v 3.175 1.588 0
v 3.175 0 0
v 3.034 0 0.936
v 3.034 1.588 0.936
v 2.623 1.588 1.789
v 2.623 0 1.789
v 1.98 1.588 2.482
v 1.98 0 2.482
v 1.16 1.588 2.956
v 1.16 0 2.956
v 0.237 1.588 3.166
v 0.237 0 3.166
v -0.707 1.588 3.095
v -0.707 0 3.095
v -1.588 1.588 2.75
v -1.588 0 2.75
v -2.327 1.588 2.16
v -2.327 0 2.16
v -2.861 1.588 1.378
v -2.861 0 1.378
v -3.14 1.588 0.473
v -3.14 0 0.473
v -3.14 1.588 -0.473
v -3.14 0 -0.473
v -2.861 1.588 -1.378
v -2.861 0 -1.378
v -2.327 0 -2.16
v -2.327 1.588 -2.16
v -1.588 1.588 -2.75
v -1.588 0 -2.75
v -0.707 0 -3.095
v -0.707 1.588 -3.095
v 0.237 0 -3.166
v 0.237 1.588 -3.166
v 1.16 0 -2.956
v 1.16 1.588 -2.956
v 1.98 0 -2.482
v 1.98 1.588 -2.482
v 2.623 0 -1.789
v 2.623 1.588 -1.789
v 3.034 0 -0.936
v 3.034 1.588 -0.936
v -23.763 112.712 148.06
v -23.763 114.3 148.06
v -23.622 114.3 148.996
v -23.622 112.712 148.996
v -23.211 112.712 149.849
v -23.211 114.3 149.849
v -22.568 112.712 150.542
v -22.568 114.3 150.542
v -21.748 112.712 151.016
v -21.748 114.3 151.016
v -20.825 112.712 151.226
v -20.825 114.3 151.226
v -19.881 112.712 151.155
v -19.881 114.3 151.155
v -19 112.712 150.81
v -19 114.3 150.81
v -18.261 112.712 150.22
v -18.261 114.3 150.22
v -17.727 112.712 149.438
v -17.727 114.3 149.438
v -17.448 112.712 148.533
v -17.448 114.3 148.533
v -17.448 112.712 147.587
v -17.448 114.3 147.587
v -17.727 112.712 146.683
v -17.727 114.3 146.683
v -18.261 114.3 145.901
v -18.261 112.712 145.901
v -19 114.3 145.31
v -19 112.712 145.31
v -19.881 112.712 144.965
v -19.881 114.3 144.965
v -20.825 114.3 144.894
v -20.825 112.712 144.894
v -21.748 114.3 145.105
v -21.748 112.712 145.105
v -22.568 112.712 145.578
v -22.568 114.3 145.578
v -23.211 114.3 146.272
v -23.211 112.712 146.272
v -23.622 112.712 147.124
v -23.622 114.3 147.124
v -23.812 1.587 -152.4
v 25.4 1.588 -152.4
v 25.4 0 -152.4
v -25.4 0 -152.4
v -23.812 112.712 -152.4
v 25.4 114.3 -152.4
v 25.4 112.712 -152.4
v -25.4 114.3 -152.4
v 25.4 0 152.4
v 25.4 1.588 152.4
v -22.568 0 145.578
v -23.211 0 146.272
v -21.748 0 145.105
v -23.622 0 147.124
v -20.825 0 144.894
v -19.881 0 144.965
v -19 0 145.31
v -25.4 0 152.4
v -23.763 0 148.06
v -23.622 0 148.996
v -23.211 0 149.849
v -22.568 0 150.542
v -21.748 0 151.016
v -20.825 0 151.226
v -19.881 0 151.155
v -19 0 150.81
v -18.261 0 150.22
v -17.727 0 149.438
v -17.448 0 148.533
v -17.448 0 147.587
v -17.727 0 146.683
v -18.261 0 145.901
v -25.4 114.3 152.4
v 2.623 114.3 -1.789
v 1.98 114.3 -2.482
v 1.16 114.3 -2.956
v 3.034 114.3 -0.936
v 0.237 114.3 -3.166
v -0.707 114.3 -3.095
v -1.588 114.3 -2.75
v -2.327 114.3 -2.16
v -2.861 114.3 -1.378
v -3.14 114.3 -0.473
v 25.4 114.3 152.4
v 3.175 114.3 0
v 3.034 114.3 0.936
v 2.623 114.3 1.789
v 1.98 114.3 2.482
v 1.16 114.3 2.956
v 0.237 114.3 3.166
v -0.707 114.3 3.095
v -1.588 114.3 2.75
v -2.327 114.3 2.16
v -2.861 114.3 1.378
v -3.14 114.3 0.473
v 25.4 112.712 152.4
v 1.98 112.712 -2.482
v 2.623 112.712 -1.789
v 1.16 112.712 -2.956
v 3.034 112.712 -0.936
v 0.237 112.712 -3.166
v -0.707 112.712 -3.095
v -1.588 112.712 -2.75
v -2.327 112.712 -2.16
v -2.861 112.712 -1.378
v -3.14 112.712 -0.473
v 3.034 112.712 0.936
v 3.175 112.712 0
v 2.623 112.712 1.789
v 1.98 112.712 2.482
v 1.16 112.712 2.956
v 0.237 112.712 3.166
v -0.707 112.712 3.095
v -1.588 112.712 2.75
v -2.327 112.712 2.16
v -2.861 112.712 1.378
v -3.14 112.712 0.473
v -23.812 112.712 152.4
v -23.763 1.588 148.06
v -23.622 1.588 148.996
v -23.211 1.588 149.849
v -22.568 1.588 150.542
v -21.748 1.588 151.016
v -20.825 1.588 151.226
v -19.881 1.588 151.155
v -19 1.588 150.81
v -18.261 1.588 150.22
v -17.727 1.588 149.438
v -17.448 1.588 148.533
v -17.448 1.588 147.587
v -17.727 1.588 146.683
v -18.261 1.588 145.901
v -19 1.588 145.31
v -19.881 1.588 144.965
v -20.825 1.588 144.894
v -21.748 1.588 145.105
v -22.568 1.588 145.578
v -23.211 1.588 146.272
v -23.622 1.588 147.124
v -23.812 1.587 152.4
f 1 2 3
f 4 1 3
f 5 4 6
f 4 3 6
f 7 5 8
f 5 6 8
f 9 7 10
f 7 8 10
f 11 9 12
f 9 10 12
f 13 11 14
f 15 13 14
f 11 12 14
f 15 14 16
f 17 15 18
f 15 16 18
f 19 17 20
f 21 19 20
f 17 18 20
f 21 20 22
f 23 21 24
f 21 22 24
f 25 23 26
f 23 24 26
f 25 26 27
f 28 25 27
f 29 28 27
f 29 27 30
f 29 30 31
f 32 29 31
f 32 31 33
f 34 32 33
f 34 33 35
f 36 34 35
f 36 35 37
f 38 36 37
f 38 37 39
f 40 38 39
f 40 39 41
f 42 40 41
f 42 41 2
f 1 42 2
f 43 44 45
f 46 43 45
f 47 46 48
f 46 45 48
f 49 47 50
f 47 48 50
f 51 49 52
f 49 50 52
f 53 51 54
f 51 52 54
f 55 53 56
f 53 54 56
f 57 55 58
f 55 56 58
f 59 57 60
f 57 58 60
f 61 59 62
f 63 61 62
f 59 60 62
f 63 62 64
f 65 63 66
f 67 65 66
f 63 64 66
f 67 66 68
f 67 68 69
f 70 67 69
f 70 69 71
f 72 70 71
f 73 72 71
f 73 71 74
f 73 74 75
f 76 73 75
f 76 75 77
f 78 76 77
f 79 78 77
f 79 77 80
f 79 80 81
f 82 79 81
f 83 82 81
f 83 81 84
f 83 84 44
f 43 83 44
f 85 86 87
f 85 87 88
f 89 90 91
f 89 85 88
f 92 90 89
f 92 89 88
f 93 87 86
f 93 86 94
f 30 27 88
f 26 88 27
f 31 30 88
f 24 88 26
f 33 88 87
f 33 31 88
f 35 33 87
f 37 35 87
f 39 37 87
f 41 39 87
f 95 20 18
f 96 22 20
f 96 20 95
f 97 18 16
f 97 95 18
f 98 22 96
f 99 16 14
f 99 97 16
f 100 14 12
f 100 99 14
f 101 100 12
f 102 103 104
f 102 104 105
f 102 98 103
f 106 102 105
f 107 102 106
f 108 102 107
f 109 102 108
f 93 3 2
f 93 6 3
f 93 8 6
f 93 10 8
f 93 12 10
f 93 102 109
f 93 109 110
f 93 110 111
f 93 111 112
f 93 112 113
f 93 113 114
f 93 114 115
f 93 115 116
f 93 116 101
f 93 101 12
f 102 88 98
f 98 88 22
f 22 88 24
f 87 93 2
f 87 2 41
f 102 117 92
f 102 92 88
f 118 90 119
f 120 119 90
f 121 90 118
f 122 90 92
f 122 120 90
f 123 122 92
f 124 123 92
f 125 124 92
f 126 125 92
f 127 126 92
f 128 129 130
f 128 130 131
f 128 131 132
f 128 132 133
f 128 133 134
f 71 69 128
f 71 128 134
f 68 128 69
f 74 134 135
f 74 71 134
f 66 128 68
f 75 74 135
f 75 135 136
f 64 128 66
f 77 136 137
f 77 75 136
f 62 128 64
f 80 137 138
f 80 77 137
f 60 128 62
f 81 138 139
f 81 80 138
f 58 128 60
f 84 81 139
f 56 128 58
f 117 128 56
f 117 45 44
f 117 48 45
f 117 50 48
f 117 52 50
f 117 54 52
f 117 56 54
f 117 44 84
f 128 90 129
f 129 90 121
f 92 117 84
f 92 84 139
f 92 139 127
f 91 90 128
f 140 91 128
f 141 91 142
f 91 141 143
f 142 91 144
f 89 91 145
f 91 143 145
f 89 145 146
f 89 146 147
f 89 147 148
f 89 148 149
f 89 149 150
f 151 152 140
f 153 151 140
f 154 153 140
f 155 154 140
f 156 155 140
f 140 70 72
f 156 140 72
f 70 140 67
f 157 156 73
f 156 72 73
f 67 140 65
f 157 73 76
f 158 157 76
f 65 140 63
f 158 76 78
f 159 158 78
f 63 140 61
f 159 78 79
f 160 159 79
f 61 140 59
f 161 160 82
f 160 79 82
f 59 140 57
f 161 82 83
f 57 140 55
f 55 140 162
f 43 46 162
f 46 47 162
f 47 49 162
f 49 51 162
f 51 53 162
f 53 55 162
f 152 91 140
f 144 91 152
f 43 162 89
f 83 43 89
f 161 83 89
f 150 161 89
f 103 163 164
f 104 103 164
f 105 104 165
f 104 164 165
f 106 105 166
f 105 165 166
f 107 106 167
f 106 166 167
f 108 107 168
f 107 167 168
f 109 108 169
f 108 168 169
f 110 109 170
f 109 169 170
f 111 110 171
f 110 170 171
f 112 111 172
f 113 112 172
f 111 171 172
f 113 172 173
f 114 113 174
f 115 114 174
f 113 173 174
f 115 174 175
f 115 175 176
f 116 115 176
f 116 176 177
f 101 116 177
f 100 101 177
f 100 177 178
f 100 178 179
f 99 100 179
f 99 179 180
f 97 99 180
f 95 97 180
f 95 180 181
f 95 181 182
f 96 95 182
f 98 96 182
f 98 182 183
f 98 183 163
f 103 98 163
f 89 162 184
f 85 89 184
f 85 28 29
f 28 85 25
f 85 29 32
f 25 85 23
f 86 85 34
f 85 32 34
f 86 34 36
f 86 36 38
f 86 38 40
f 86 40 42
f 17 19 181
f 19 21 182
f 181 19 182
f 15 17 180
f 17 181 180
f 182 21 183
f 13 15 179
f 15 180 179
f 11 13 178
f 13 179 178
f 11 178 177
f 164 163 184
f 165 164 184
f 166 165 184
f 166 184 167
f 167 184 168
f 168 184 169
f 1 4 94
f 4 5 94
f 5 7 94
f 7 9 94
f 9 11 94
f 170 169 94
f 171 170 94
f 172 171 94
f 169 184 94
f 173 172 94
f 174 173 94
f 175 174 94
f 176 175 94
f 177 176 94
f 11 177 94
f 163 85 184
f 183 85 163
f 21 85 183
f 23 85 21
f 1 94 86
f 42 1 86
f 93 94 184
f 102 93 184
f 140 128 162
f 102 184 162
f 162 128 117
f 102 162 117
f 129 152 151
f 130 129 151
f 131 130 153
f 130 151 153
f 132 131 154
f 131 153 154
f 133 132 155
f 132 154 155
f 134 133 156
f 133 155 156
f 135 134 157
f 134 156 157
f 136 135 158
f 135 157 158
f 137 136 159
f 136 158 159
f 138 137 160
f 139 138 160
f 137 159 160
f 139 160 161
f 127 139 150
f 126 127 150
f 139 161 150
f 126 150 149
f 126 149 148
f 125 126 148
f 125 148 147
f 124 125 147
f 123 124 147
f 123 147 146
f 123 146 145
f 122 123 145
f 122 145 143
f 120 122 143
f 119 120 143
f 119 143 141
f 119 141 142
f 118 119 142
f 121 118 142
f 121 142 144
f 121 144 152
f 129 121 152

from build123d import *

# Parameters (mm, degrees)
F0_W     = 50.8
F0_H     = 304.8
F1_DEPTH = 1.5875
F2_W     = 114.3
F2_H     = 304.8
F3_DEPTH = 1.5875
F4_W     = 50.8
F4_H     = 304.8
F5_DEPTH = 1.5875
F6_R     = 3.175
F7_DEPTH = 136.906
F8_R     = 3.175
F9_DEPTH = 146.304


with BuildPart() as f1:
    # F0 (on Front) → F1 (new body)
    with BuildSketch(Plane.XZ):
        Rectangle(F0_W, F0_H)
    extrude(amount=-F1_DEPTH)

    # F2 (on face) → F3 (join)
    with BuildSketch(Plane(origin=(-25.4, 0, 0), x_dir=(0, -1, 0), z_dir=(-1, 0, 0))):
        with Locations((-57.15, 0)):
            Rectangle(F2_W, F2_H)
    extrude(amount=-F3_DEPTH)

    # F4 (on face) → F5 (join)
    with BuildSketch(Plane(origin=(0, 114.3, 0), x_dir=(-1, 0, 0), z_dir=(0, 1, 0))):
        Rectangle(F4_W, F4_H)
    extrude(amount=-F5_DEPTH)

    # F6 (on face) → F7 (cut)
    with BuildSketch(Plane(origin=(0, 114.3, 0), x_dir=(-1, 0, 0), z_dir=(0, 1, 0))):
        with Locations((20.58794, 148.060083)):
            Circle(F6_R)
    extrude(amount=-F7_DEPTH, mode=Mode.SUBTRACT)

    # F8 (on face) → F9 (cut)
    with BuildSketch(Plane.XZ):
        Circle(F8_R)
    extrude(amount=-F9_DEPTH, mode=Mode.SUBTRACT)


solid = f1.part
